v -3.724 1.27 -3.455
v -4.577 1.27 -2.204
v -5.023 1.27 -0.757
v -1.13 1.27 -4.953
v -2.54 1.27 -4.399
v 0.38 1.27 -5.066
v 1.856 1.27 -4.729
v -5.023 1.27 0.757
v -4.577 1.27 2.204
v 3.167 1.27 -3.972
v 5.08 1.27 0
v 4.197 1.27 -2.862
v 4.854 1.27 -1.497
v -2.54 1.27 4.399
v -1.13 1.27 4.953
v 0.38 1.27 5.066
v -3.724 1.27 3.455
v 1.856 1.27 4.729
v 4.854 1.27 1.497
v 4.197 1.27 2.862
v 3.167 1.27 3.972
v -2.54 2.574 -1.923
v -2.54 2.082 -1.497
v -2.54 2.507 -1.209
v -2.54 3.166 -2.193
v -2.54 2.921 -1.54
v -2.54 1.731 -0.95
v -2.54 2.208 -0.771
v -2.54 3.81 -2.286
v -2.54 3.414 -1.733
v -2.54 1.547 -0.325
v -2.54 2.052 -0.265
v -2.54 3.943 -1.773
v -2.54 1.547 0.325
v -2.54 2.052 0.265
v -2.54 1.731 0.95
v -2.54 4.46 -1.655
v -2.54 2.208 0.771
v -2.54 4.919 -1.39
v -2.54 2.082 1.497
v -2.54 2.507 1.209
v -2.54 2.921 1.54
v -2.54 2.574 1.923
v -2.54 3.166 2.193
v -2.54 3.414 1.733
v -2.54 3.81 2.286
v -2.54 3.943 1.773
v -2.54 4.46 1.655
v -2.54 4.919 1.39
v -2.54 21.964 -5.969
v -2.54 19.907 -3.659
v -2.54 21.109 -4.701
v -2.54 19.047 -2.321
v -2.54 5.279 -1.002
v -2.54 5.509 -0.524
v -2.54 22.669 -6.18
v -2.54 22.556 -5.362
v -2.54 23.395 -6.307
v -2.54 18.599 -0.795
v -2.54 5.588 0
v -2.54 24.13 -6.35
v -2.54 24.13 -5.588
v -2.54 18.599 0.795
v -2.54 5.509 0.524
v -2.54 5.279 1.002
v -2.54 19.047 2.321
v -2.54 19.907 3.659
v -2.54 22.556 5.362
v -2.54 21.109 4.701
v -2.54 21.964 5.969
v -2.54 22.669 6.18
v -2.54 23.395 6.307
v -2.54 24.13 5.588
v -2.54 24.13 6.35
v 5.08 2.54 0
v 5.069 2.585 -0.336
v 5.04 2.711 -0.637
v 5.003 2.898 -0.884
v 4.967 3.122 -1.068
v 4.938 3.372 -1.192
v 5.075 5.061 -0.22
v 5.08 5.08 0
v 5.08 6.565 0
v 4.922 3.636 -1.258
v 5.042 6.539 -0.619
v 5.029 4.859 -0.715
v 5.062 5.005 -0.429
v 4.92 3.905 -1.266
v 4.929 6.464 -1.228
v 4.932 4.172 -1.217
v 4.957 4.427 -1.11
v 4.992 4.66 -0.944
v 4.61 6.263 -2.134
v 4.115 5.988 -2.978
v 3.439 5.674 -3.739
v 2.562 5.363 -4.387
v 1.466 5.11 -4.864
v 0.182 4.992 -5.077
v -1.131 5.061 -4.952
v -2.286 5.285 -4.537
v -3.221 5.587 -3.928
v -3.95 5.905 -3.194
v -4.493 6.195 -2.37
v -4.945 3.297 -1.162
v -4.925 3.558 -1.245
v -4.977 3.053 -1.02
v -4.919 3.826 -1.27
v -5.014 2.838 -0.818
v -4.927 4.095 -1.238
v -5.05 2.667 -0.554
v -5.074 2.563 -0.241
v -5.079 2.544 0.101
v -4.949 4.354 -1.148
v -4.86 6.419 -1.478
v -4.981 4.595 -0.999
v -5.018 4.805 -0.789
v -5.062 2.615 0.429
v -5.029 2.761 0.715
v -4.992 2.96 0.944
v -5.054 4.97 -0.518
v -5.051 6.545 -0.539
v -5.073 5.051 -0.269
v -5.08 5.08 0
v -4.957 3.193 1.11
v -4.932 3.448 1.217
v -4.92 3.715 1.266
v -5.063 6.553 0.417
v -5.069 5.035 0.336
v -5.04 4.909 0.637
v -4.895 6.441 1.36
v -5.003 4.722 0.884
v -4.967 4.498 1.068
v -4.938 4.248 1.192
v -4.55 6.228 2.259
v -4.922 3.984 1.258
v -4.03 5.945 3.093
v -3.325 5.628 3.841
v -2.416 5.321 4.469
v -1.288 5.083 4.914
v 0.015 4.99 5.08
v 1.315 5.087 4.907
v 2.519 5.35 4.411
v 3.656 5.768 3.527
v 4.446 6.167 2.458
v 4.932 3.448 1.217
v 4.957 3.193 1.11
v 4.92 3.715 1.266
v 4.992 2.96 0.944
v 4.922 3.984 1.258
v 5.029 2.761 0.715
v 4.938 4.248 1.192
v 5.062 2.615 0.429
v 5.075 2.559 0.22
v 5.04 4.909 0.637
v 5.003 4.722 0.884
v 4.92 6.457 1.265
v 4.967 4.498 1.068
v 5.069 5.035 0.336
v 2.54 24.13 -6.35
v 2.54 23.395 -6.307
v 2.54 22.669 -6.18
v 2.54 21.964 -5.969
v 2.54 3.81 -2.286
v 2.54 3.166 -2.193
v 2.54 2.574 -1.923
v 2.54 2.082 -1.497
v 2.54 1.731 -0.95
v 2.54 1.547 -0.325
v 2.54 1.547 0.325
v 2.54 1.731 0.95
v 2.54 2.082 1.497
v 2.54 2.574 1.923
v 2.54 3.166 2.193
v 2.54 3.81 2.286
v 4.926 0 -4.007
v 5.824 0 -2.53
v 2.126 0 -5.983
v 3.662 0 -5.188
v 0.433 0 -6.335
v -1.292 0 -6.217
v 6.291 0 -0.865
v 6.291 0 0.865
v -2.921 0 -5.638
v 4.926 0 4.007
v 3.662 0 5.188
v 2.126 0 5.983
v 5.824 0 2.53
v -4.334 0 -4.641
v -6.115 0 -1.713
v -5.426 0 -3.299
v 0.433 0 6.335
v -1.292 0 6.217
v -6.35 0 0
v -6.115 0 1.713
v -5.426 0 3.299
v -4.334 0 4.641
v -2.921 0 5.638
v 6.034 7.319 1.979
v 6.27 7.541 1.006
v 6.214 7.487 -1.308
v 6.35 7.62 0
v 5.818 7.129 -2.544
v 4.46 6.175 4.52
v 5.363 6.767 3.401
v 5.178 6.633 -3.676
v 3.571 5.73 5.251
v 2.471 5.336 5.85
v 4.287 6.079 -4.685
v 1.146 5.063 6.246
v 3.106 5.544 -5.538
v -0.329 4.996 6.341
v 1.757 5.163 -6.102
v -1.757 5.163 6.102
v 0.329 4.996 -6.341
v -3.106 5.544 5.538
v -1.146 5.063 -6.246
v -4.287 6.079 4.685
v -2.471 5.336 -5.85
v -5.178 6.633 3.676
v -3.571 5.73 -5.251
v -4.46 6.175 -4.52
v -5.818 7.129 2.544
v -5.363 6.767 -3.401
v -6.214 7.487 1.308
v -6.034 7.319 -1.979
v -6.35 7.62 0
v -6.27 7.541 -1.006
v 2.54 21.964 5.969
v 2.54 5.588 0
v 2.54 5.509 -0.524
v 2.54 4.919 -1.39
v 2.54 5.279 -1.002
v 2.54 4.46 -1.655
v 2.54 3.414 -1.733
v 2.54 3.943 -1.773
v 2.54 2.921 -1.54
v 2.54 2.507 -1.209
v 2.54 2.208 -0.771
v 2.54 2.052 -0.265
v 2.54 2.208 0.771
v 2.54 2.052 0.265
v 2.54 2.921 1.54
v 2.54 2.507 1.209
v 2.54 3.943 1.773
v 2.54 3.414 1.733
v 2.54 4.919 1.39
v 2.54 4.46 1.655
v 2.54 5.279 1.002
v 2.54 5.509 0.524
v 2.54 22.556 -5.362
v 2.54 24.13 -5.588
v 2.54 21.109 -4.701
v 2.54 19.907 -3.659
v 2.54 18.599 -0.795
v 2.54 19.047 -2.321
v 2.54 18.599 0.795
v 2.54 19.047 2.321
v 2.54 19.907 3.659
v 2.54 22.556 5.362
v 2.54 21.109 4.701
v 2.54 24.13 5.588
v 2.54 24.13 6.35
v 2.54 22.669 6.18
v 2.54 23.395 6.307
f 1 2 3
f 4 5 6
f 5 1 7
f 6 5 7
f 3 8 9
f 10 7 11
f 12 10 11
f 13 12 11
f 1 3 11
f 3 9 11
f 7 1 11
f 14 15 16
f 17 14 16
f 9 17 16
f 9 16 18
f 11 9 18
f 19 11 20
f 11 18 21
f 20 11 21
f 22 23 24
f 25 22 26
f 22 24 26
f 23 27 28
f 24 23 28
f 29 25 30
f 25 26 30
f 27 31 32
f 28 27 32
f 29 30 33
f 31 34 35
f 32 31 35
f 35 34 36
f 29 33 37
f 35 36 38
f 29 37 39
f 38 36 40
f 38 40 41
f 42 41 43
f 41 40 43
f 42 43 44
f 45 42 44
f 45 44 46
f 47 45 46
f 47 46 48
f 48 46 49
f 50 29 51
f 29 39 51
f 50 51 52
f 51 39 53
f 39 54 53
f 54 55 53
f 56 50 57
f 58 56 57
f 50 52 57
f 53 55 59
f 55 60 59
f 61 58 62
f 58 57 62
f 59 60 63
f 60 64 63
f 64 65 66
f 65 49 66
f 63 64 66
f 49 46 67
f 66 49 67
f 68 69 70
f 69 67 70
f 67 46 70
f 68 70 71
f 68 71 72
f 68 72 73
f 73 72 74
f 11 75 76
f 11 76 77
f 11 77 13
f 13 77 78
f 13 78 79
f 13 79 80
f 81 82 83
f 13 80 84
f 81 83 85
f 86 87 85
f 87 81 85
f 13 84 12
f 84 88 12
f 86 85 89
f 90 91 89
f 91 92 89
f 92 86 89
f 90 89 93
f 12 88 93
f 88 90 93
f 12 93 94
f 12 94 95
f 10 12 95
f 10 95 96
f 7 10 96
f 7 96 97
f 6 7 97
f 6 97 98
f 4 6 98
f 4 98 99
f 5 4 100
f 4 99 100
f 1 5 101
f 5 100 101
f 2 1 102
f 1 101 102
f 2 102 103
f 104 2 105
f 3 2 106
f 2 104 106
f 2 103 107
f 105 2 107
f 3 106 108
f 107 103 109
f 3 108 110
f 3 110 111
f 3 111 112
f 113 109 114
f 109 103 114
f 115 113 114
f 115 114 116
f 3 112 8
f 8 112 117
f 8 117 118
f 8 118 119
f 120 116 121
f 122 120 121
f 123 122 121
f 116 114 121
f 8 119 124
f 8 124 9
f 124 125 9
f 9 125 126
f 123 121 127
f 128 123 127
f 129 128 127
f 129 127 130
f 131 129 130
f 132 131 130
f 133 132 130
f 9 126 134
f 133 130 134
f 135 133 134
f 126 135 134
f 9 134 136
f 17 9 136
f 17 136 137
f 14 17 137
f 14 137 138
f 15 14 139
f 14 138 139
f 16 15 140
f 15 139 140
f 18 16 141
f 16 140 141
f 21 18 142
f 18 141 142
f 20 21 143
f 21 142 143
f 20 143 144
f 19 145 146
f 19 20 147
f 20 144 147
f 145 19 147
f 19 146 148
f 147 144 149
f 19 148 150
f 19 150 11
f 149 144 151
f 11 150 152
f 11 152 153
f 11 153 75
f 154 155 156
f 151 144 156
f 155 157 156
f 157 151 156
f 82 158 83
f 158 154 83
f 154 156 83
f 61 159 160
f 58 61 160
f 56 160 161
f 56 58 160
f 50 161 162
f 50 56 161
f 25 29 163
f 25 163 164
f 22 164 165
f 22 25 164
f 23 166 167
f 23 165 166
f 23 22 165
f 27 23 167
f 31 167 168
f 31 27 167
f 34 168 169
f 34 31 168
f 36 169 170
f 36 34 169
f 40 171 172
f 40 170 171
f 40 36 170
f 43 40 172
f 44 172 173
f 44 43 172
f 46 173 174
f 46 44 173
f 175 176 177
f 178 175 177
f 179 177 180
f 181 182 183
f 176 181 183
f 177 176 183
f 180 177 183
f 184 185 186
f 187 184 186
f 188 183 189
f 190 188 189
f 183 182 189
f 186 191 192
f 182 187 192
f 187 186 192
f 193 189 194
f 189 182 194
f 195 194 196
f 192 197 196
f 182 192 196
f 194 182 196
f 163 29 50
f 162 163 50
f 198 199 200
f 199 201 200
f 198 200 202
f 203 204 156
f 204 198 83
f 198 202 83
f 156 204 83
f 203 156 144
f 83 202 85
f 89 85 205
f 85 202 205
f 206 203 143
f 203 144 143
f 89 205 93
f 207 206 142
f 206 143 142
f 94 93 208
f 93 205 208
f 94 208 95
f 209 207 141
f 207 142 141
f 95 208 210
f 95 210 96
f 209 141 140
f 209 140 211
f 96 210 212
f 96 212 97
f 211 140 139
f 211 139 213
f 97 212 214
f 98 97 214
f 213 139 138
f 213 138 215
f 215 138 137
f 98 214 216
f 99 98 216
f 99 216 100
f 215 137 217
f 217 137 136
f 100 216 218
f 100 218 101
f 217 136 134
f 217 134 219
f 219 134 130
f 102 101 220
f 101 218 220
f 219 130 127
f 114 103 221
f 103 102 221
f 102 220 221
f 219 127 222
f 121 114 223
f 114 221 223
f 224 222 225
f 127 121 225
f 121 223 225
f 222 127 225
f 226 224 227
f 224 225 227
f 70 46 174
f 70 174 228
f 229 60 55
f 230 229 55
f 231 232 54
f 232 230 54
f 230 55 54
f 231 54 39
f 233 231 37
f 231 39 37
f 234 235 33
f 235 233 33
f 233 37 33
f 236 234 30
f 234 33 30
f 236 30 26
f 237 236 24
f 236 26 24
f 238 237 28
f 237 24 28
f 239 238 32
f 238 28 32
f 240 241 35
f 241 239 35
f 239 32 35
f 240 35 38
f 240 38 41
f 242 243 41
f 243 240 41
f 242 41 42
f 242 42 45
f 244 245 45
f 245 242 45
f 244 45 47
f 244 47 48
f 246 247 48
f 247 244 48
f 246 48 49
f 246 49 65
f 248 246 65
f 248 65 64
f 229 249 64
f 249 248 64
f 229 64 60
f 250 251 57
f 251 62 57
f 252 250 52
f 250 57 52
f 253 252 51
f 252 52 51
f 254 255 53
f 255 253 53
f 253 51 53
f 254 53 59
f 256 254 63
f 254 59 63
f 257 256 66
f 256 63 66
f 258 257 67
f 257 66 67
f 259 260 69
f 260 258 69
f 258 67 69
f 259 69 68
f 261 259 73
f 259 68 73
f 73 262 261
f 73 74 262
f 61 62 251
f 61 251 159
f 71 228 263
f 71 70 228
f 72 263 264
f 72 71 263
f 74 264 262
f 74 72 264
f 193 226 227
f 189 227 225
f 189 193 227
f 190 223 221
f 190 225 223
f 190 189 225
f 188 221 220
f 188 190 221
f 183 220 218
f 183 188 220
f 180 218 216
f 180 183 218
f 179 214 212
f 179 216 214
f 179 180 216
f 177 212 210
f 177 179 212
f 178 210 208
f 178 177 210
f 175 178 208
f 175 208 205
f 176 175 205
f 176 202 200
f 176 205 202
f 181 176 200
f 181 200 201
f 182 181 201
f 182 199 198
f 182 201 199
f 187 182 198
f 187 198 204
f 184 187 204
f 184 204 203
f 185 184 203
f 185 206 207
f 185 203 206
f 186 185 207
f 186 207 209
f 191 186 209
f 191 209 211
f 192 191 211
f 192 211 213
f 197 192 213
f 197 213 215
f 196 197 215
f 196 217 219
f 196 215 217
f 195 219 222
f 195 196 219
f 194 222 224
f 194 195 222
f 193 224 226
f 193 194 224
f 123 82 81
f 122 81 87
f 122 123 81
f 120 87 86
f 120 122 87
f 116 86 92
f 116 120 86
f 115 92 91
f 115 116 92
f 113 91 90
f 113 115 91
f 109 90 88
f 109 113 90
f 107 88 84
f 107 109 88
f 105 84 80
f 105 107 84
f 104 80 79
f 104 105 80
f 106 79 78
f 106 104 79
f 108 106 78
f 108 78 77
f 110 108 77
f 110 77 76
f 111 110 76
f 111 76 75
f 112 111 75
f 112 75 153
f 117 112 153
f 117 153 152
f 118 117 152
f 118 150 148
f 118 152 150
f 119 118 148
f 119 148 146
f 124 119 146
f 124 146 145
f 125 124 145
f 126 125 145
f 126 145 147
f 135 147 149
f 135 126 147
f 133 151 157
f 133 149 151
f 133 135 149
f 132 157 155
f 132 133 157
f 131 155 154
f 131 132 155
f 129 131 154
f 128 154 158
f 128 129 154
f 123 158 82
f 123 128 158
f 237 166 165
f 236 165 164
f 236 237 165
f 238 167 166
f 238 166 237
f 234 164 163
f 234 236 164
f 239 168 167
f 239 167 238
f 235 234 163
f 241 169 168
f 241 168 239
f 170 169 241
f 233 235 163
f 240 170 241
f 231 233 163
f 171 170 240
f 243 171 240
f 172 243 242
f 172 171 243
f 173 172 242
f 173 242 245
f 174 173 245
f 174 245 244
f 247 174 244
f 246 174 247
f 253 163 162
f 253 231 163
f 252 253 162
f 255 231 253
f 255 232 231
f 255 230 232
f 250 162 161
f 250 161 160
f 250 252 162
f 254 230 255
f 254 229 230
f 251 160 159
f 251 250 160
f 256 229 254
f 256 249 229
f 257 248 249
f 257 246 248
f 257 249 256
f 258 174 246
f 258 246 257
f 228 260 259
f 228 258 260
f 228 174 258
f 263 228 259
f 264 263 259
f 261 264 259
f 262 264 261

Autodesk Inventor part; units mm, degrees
ref_plane "XZ Plane" through (0, 0, 0) normal (0, 1, 0) x (-1, 0, 0)
ref_plane "XY Plane" through (0, 0, 0) normal (0, 0, 1) x (1, 0, 0)
sketch "Sketch1" plane through (0, 0, 0) normal (0, 1, 0) x (-1, 0, 0)
  circle A0 centre (0, 0) radius 6.35
  dimension "d0" = 12.7
extrude "Extrusion1" add sketch "Sketch1" along normal blind 7.62
sketch "Sketch2" plane through (0, 0, 0) normal (0, 0, 1) x (1, 0, 0)
  line L0 (6.35, 7.62) -> (-6.35, 7.62) projected
  arc A0 (-6.35, 7.62) -> (6.35, 7.62) centre (0, 13.97) ccw
  line L1 (-6.35, 7.62) -> (-6.35, 5.08) construction
  line L2 (-6.35, 0) -> (-6.35, 7.62) construction
  point P0 (0, 0)
  dimension "d5" = 2.54
  dimension "d6" = 8.89
extrude "Extrusion2" cut sketch "Sketch2" along normal mid plane 25.4
ref_plane "Work Plane1" through (0, 7.62, 0) normal (0, -1, 0) x (1, 0, 0)
sketch "Sketch3" plane through (0, 7.62, 0) normal (0, -1, 0) x (1, 0, 0)
  circle A0 centre (0, 0) radius 5.08
  dimension "d10" = 10.16
extrude "Extrusion3" cut sketch "Sketch3" along normal blind 6.35
sketch "Sketch4" plane through (0, 0, 0) normal (1, 0, 0) x (0, 1, 0)
  circle A0 centre (3.81, 0) radius 1.27
  line L0 (1.27, 5.08) -> (1.27, -5.08) projected
  point P0 (0, 0)
  dimension "d13" = 2.54
  dimension "d14" = 2.54
extrude "Extrusion4" add sketch "Sketch4" along normal mid plane 11.43
sketch "Sketch5" plane through (0, 0, 0) normal (1, 0, 0) x (0, 1, 0)
  circle A0 centre (3.81, 0) radius 1.778
  arc A1 (3.81, 2.286) -> (3.81, -2.286) centre (3.81, 0) ccw
  arc A2 (24.13, 5.588) -> (24.13, -5.588) centre (24.13, 0) ccw
  line L0 (24.13, 6.35) -> (24.13, 5.588)
  line L1 (24.13, -5.588) -> (24.13, -6.35)
  line L2 (3.81, 2.286) -> (21.9635, 5.969)
  line L3 (3.81, -2.286) -> (21.9635, -5.969)
  arc A3 (24.13, 6.35) -> (21.9635, 5.969) centre (24.13, 0) ccw
  arc A4 (21.9635, -5.969) -> (24.13, -6.35) centre (24.13, 0) ccw
  point P0 (0, 0)
  point P1 (3.81, 1.27)
  dimension "d17" = 3.556
  dimension "d18" = 4.572
  dimension "d21" = 11.176
  dimension "d22" = 0
  dimension "d23" = 20.32
extrude "Extrusion5" add sketch "Sketch5" along normal mid plane 5.08
properties part number "PistonTest1"
